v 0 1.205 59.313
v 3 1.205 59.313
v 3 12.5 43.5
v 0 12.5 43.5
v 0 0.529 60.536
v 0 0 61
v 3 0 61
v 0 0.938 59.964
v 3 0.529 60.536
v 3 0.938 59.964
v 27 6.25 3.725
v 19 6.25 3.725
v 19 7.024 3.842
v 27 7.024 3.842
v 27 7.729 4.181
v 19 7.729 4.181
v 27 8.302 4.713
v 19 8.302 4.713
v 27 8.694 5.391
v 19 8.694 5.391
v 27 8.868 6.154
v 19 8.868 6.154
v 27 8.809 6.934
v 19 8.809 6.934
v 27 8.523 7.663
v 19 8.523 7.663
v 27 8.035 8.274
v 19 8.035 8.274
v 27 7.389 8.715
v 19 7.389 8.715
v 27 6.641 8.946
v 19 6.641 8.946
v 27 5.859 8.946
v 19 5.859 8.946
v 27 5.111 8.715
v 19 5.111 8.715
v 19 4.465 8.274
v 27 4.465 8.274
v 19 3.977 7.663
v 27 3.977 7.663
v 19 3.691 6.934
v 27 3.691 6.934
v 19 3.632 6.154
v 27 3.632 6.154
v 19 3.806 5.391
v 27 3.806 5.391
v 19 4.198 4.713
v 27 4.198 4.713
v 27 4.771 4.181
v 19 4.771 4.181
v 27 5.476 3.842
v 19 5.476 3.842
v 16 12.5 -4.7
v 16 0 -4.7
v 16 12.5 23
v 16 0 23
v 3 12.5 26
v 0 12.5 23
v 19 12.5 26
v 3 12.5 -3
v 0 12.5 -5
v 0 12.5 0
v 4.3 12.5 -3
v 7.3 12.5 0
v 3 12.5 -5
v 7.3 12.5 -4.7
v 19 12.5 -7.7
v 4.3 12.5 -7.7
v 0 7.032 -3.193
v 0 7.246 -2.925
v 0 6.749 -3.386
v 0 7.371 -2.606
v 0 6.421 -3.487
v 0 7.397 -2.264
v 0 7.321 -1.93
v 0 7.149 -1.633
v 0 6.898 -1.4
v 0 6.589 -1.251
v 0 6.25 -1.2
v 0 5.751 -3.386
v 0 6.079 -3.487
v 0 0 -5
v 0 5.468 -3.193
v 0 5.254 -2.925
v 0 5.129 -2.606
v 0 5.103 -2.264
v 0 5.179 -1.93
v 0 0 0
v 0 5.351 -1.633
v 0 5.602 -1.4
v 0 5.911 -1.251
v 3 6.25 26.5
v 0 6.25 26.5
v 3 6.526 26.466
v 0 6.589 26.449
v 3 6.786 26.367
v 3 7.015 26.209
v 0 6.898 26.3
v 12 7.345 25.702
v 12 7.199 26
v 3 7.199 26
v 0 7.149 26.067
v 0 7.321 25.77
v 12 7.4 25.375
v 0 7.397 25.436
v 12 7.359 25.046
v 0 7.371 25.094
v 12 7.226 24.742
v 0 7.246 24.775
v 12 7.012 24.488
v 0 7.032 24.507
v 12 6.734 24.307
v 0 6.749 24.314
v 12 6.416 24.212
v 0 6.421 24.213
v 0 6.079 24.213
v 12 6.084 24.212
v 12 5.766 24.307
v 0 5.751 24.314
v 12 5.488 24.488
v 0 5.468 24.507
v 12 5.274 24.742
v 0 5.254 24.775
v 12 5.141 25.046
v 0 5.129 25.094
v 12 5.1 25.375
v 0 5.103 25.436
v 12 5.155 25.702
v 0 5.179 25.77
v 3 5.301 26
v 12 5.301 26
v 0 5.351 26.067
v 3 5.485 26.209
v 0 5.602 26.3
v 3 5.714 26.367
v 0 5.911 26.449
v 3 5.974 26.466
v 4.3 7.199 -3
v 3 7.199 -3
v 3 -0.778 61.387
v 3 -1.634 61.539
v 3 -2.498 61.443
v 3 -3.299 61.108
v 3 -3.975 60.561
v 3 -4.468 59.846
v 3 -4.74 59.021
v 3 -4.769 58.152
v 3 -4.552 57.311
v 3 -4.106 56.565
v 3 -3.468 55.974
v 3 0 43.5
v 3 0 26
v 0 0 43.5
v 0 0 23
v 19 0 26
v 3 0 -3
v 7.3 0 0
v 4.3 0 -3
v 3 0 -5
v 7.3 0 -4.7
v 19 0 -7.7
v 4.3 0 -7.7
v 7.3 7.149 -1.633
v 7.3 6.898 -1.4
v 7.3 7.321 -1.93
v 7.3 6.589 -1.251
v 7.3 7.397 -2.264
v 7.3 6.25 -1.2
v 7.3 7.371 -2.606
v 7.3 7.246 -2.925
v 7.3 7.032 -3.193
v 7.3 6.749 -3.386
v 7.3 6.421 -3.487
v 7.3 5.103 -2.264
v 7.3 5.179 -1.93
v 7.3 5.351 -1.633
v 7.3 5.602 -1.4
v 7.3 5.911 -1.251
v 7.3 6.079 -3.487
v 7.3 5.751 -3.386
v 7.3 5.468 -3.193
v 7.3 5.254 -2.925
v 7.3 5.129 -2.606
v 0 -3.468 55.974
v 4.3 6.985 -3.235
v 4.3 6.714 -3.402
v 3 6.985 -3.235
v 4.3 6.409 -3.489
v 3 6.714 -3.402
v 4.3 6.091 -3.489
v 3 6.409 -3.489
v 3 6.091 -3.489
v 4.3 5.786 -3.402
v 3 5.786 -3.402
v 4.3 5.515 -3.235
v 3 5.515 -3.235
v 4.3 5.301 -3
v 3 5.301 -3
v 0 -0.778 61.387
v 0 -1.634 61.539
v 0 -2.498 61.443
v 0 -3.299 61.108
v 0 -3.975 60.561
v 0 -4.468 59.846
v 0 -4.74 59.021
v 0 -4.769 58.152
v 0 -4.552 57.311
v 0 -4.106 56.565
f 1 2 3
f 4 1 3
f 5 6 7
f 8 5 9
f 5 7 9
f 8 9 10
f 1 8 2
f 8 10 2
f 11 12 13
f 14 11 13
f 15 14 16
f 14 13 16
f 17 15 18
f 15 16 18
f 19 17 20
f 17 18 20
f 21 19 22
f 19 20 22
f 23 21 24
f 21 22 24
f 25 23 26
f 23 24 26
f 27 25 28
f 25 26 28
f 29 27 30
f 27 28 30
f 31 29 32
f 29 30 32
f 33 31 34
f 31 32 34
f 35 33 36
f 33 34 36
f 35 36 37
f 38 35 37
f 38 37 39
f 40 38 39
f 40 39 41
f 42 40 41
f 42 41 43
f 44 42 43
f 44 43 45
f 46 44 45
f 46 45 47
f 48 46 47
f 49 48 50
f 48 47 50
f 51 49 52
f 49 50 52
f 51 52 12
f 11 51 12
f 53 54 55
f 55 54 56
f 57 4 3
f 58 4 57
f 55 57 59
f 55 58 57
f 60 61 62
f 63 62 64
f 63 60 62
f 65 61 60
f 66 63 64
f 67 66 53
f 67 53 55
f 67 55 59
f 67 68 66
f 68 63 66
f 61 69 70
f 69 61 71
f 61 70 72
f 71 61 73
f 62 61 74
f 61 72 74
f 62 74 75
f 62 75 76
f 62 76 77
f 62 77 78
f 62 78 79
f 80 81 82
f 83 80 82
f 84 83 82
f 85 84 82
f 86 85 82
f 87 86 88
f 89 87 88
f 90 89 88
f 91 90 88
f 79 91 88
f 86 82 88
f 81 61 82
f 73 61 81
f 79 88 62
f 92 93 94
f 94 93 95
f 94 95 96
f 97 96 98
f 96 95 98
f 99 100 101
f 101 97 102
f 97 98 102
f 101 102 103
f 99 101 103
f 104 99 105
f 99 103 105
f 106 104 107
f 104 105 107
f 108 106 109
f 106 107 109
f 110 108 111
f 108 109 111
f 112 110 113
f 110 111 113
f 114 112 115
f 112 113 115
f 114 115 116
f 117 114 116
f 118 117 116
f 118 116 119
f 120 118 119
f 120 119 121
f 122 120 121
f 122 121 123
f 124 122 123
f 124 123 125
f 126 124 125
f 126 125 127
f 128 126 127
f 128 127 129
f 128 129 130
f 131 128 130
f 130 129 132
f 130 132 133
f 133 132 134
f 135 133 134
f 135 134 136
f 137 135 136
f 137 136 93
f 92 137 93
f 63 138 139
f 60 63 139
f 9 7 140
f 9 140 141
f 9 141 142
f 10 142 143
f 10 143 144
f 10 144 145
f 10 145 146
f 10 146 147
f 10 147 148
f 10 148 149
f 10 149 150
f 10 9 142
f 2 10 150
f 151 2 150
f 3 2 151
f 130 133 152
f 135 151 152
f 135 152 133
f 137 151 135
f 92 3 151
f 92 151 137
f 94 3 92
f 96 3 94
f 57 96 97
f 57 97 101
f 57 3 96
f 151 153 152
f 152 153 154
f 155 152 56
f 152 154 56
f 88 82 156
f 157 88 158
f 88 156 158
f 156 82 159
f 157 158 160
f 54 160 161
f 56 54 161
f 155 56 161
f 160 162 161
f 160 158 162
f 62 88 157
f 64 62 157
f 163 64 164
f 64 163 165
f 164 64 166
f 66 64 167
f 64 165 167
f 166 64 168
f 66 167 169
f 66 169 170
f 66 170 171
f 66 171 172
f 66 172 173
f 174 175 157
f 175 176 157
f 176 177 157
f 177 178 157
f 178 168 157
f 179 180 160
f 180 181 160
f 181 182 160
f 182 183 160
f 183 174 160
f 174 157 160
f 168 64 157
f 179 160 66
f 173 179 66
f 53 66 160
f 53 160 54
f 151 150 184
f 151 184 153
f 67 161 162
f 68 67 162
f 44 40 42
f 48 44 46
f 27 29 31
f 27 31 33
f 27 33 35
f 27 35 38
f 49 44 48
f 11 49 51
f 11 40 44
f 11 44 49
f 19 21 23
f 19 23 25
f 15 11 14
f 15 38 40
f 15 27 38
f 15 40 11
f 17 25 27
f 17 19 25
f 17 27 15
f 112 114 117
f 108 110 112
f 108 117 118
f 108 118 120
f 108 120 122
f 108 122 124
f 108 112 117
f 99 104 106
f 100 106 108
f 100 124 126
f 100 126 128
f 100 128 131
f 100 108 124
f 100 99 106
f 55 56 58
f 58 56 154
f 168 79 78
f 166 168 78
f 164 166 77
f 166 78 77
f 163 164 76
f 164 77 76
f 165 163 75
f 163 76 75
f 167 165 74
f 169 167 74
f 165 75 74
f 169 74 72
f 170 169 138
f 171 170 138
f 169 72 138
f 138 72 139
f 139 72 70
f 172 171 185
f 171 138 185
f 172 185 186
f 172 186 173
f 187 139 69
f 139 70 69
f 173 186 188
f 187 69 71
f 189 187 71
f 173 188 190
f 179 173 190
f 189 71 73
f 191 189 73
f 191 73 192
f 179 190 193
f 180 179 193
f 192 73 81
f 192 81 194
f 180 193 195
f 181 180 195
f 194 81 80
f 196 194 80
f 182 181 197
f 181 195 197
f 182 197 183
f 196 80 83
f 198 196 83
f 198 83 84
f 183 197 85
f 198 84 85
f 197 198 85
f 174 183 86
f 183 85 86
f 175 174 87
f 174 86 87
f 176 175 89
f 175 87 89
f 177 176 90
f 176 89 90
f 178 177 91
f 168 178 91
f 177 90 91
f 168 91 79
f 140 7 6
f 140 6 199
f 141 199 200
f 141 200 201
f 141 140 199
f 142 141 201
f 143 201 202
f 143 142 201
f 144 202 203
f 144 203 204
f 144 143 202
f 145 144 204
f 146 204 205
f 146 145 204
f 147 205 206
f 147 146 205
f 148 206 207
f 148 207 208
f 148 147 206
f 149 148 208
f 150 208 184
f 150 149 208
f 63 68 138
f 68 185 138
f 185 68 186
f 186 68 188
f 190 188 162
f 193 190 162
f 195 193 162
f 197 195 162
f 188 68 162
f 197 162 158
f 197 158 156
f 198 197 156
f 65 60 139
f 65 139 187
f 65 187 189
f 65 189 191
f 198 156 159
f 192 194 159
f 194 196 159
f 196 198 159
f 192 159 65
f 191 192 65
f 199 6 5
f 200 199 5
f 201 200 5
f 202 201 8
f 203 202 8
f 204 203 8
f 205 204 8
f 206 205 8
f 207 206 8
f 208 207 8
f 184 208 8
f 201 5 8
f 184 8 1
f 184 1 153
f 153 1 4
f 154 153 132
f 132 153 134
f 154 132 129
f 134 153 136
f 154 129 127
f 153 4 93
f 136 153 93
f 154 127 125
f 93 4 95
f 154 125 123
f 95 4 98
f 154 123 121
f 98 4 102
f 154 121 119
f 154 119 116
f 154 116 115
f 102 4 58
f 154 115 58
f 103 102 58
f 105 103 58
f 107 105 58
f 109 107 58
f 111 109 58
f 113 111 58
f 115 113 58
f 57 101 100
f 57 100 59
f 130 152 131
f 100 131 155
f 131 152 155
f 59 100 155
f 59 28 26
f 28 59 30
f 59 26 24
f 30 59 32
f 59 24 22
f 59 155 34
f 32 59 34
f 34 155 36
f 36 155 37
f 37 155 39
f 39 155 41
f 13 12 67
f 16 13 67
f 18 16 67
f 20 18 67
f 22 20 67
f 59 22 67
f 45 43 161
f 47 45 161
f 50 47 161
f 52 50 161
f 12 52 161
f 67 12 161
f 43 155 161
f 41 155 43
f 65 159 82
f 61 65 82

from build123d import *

# Parameters (mm, degrees)
EXTRUDE_1_DEPTH     = 12.5
SKETCH_2_R          = 1.15
CUT_EXTRUDE_1_DEPTH = 12
SKETCH_3_R          = 2.625
EXTRUDE_2_DEPTH     = 8
CUT_EXTRUDE_2_DEPTH = 8
EXTRUDE_3_DEPTH     = 3


with BuildPart() as part:
    # 草图1 → 凸台-拉伸1 (new body)
    with BuildSketch(Plane(origin=(0, 0, 0), x_dir=(1, 0, 0), z_dir=(0, 1, 0))):
        Polygon((0, 5), (0, 0), (7.3, 0), (7.3, 3), (7.3, 4.7), (16, 4.7), (16, 3), (16, 0), (16, -23), (0, -23), (0, -61), (3, -61), (3, -26), (19, -26), (19, 3), (19, 7.7), (4.3, 7.7), (4.3, 3), (3, 3), (3, 5), align=None)
    extrude(amount=EXTRUDE_1_DEPTH)

    # 草图2 → 切除-拉伸1 (cut)
    with BuildSketch(Plane.ZY):
        with Locations((-2.35, 6.25)):
            Circle(SKETCH_2_R)
        with Locations((25.35, 6.25)):
            Circle(SKETCH_2_R)
    extrude(amount=-CUT_EXTRUDE_1_DEPTH, mode=Mode.SUBTRACT)

    # 草图3 → 凸台-拉伸2 (add)
    with BuildSketch(Plane(origin=(19, 0, 0), x_dir=(0, 0, -1), z_dir=(1, 0, 0))):
        with Locations((-6.35, 6.25)):
            Circle(SKETCH_3_R)
    extrude(amount=EXTRUDE_2_DEPTH)

    # 草图4 → 切除-拉伸2 (cut)
    with BuildSketch(Plane(origin=(3, 0, 0), x_dir=(0, 0, -1), z_dir=(1, 0, 0))):
        with BuildLine():
            Line((-61, 12.5), (-61, 0))
            ThreePointArc((-61, 0), (-60.261770725, 0.750275482), (-59.312624964, 1.205267883))
            Line((-59.312624964, 1.205267883), (-43.5, 12.5))
            Line((-43.5, 12.5), (-61, 12.5))
        make_face()
    extrude(amount=-CUT_EXTRUDE_2_DEPTH, mode=Mode.SUBTRACT)

    # 草图4<4> → 凸台-拉伸3 (add)
    with BuildSketch(Plane(origin=(3, 0, 0), x_dir=(0, 0, -1), z_dir=(1, 0, 0))):
        with BuildLine():
            ThreePointArc((-61, 0), (-60.221329006, -4.246956372), (-55.974372634, -3.468285379))
            Line((-55.974372634, -3.468285379), (-43.5, 0))
            Line((-43.5, 0), (-61, 0))
        make_face()
    extrude(amount=-EXTRUDE_3_DEPTH)


solid = part.part
